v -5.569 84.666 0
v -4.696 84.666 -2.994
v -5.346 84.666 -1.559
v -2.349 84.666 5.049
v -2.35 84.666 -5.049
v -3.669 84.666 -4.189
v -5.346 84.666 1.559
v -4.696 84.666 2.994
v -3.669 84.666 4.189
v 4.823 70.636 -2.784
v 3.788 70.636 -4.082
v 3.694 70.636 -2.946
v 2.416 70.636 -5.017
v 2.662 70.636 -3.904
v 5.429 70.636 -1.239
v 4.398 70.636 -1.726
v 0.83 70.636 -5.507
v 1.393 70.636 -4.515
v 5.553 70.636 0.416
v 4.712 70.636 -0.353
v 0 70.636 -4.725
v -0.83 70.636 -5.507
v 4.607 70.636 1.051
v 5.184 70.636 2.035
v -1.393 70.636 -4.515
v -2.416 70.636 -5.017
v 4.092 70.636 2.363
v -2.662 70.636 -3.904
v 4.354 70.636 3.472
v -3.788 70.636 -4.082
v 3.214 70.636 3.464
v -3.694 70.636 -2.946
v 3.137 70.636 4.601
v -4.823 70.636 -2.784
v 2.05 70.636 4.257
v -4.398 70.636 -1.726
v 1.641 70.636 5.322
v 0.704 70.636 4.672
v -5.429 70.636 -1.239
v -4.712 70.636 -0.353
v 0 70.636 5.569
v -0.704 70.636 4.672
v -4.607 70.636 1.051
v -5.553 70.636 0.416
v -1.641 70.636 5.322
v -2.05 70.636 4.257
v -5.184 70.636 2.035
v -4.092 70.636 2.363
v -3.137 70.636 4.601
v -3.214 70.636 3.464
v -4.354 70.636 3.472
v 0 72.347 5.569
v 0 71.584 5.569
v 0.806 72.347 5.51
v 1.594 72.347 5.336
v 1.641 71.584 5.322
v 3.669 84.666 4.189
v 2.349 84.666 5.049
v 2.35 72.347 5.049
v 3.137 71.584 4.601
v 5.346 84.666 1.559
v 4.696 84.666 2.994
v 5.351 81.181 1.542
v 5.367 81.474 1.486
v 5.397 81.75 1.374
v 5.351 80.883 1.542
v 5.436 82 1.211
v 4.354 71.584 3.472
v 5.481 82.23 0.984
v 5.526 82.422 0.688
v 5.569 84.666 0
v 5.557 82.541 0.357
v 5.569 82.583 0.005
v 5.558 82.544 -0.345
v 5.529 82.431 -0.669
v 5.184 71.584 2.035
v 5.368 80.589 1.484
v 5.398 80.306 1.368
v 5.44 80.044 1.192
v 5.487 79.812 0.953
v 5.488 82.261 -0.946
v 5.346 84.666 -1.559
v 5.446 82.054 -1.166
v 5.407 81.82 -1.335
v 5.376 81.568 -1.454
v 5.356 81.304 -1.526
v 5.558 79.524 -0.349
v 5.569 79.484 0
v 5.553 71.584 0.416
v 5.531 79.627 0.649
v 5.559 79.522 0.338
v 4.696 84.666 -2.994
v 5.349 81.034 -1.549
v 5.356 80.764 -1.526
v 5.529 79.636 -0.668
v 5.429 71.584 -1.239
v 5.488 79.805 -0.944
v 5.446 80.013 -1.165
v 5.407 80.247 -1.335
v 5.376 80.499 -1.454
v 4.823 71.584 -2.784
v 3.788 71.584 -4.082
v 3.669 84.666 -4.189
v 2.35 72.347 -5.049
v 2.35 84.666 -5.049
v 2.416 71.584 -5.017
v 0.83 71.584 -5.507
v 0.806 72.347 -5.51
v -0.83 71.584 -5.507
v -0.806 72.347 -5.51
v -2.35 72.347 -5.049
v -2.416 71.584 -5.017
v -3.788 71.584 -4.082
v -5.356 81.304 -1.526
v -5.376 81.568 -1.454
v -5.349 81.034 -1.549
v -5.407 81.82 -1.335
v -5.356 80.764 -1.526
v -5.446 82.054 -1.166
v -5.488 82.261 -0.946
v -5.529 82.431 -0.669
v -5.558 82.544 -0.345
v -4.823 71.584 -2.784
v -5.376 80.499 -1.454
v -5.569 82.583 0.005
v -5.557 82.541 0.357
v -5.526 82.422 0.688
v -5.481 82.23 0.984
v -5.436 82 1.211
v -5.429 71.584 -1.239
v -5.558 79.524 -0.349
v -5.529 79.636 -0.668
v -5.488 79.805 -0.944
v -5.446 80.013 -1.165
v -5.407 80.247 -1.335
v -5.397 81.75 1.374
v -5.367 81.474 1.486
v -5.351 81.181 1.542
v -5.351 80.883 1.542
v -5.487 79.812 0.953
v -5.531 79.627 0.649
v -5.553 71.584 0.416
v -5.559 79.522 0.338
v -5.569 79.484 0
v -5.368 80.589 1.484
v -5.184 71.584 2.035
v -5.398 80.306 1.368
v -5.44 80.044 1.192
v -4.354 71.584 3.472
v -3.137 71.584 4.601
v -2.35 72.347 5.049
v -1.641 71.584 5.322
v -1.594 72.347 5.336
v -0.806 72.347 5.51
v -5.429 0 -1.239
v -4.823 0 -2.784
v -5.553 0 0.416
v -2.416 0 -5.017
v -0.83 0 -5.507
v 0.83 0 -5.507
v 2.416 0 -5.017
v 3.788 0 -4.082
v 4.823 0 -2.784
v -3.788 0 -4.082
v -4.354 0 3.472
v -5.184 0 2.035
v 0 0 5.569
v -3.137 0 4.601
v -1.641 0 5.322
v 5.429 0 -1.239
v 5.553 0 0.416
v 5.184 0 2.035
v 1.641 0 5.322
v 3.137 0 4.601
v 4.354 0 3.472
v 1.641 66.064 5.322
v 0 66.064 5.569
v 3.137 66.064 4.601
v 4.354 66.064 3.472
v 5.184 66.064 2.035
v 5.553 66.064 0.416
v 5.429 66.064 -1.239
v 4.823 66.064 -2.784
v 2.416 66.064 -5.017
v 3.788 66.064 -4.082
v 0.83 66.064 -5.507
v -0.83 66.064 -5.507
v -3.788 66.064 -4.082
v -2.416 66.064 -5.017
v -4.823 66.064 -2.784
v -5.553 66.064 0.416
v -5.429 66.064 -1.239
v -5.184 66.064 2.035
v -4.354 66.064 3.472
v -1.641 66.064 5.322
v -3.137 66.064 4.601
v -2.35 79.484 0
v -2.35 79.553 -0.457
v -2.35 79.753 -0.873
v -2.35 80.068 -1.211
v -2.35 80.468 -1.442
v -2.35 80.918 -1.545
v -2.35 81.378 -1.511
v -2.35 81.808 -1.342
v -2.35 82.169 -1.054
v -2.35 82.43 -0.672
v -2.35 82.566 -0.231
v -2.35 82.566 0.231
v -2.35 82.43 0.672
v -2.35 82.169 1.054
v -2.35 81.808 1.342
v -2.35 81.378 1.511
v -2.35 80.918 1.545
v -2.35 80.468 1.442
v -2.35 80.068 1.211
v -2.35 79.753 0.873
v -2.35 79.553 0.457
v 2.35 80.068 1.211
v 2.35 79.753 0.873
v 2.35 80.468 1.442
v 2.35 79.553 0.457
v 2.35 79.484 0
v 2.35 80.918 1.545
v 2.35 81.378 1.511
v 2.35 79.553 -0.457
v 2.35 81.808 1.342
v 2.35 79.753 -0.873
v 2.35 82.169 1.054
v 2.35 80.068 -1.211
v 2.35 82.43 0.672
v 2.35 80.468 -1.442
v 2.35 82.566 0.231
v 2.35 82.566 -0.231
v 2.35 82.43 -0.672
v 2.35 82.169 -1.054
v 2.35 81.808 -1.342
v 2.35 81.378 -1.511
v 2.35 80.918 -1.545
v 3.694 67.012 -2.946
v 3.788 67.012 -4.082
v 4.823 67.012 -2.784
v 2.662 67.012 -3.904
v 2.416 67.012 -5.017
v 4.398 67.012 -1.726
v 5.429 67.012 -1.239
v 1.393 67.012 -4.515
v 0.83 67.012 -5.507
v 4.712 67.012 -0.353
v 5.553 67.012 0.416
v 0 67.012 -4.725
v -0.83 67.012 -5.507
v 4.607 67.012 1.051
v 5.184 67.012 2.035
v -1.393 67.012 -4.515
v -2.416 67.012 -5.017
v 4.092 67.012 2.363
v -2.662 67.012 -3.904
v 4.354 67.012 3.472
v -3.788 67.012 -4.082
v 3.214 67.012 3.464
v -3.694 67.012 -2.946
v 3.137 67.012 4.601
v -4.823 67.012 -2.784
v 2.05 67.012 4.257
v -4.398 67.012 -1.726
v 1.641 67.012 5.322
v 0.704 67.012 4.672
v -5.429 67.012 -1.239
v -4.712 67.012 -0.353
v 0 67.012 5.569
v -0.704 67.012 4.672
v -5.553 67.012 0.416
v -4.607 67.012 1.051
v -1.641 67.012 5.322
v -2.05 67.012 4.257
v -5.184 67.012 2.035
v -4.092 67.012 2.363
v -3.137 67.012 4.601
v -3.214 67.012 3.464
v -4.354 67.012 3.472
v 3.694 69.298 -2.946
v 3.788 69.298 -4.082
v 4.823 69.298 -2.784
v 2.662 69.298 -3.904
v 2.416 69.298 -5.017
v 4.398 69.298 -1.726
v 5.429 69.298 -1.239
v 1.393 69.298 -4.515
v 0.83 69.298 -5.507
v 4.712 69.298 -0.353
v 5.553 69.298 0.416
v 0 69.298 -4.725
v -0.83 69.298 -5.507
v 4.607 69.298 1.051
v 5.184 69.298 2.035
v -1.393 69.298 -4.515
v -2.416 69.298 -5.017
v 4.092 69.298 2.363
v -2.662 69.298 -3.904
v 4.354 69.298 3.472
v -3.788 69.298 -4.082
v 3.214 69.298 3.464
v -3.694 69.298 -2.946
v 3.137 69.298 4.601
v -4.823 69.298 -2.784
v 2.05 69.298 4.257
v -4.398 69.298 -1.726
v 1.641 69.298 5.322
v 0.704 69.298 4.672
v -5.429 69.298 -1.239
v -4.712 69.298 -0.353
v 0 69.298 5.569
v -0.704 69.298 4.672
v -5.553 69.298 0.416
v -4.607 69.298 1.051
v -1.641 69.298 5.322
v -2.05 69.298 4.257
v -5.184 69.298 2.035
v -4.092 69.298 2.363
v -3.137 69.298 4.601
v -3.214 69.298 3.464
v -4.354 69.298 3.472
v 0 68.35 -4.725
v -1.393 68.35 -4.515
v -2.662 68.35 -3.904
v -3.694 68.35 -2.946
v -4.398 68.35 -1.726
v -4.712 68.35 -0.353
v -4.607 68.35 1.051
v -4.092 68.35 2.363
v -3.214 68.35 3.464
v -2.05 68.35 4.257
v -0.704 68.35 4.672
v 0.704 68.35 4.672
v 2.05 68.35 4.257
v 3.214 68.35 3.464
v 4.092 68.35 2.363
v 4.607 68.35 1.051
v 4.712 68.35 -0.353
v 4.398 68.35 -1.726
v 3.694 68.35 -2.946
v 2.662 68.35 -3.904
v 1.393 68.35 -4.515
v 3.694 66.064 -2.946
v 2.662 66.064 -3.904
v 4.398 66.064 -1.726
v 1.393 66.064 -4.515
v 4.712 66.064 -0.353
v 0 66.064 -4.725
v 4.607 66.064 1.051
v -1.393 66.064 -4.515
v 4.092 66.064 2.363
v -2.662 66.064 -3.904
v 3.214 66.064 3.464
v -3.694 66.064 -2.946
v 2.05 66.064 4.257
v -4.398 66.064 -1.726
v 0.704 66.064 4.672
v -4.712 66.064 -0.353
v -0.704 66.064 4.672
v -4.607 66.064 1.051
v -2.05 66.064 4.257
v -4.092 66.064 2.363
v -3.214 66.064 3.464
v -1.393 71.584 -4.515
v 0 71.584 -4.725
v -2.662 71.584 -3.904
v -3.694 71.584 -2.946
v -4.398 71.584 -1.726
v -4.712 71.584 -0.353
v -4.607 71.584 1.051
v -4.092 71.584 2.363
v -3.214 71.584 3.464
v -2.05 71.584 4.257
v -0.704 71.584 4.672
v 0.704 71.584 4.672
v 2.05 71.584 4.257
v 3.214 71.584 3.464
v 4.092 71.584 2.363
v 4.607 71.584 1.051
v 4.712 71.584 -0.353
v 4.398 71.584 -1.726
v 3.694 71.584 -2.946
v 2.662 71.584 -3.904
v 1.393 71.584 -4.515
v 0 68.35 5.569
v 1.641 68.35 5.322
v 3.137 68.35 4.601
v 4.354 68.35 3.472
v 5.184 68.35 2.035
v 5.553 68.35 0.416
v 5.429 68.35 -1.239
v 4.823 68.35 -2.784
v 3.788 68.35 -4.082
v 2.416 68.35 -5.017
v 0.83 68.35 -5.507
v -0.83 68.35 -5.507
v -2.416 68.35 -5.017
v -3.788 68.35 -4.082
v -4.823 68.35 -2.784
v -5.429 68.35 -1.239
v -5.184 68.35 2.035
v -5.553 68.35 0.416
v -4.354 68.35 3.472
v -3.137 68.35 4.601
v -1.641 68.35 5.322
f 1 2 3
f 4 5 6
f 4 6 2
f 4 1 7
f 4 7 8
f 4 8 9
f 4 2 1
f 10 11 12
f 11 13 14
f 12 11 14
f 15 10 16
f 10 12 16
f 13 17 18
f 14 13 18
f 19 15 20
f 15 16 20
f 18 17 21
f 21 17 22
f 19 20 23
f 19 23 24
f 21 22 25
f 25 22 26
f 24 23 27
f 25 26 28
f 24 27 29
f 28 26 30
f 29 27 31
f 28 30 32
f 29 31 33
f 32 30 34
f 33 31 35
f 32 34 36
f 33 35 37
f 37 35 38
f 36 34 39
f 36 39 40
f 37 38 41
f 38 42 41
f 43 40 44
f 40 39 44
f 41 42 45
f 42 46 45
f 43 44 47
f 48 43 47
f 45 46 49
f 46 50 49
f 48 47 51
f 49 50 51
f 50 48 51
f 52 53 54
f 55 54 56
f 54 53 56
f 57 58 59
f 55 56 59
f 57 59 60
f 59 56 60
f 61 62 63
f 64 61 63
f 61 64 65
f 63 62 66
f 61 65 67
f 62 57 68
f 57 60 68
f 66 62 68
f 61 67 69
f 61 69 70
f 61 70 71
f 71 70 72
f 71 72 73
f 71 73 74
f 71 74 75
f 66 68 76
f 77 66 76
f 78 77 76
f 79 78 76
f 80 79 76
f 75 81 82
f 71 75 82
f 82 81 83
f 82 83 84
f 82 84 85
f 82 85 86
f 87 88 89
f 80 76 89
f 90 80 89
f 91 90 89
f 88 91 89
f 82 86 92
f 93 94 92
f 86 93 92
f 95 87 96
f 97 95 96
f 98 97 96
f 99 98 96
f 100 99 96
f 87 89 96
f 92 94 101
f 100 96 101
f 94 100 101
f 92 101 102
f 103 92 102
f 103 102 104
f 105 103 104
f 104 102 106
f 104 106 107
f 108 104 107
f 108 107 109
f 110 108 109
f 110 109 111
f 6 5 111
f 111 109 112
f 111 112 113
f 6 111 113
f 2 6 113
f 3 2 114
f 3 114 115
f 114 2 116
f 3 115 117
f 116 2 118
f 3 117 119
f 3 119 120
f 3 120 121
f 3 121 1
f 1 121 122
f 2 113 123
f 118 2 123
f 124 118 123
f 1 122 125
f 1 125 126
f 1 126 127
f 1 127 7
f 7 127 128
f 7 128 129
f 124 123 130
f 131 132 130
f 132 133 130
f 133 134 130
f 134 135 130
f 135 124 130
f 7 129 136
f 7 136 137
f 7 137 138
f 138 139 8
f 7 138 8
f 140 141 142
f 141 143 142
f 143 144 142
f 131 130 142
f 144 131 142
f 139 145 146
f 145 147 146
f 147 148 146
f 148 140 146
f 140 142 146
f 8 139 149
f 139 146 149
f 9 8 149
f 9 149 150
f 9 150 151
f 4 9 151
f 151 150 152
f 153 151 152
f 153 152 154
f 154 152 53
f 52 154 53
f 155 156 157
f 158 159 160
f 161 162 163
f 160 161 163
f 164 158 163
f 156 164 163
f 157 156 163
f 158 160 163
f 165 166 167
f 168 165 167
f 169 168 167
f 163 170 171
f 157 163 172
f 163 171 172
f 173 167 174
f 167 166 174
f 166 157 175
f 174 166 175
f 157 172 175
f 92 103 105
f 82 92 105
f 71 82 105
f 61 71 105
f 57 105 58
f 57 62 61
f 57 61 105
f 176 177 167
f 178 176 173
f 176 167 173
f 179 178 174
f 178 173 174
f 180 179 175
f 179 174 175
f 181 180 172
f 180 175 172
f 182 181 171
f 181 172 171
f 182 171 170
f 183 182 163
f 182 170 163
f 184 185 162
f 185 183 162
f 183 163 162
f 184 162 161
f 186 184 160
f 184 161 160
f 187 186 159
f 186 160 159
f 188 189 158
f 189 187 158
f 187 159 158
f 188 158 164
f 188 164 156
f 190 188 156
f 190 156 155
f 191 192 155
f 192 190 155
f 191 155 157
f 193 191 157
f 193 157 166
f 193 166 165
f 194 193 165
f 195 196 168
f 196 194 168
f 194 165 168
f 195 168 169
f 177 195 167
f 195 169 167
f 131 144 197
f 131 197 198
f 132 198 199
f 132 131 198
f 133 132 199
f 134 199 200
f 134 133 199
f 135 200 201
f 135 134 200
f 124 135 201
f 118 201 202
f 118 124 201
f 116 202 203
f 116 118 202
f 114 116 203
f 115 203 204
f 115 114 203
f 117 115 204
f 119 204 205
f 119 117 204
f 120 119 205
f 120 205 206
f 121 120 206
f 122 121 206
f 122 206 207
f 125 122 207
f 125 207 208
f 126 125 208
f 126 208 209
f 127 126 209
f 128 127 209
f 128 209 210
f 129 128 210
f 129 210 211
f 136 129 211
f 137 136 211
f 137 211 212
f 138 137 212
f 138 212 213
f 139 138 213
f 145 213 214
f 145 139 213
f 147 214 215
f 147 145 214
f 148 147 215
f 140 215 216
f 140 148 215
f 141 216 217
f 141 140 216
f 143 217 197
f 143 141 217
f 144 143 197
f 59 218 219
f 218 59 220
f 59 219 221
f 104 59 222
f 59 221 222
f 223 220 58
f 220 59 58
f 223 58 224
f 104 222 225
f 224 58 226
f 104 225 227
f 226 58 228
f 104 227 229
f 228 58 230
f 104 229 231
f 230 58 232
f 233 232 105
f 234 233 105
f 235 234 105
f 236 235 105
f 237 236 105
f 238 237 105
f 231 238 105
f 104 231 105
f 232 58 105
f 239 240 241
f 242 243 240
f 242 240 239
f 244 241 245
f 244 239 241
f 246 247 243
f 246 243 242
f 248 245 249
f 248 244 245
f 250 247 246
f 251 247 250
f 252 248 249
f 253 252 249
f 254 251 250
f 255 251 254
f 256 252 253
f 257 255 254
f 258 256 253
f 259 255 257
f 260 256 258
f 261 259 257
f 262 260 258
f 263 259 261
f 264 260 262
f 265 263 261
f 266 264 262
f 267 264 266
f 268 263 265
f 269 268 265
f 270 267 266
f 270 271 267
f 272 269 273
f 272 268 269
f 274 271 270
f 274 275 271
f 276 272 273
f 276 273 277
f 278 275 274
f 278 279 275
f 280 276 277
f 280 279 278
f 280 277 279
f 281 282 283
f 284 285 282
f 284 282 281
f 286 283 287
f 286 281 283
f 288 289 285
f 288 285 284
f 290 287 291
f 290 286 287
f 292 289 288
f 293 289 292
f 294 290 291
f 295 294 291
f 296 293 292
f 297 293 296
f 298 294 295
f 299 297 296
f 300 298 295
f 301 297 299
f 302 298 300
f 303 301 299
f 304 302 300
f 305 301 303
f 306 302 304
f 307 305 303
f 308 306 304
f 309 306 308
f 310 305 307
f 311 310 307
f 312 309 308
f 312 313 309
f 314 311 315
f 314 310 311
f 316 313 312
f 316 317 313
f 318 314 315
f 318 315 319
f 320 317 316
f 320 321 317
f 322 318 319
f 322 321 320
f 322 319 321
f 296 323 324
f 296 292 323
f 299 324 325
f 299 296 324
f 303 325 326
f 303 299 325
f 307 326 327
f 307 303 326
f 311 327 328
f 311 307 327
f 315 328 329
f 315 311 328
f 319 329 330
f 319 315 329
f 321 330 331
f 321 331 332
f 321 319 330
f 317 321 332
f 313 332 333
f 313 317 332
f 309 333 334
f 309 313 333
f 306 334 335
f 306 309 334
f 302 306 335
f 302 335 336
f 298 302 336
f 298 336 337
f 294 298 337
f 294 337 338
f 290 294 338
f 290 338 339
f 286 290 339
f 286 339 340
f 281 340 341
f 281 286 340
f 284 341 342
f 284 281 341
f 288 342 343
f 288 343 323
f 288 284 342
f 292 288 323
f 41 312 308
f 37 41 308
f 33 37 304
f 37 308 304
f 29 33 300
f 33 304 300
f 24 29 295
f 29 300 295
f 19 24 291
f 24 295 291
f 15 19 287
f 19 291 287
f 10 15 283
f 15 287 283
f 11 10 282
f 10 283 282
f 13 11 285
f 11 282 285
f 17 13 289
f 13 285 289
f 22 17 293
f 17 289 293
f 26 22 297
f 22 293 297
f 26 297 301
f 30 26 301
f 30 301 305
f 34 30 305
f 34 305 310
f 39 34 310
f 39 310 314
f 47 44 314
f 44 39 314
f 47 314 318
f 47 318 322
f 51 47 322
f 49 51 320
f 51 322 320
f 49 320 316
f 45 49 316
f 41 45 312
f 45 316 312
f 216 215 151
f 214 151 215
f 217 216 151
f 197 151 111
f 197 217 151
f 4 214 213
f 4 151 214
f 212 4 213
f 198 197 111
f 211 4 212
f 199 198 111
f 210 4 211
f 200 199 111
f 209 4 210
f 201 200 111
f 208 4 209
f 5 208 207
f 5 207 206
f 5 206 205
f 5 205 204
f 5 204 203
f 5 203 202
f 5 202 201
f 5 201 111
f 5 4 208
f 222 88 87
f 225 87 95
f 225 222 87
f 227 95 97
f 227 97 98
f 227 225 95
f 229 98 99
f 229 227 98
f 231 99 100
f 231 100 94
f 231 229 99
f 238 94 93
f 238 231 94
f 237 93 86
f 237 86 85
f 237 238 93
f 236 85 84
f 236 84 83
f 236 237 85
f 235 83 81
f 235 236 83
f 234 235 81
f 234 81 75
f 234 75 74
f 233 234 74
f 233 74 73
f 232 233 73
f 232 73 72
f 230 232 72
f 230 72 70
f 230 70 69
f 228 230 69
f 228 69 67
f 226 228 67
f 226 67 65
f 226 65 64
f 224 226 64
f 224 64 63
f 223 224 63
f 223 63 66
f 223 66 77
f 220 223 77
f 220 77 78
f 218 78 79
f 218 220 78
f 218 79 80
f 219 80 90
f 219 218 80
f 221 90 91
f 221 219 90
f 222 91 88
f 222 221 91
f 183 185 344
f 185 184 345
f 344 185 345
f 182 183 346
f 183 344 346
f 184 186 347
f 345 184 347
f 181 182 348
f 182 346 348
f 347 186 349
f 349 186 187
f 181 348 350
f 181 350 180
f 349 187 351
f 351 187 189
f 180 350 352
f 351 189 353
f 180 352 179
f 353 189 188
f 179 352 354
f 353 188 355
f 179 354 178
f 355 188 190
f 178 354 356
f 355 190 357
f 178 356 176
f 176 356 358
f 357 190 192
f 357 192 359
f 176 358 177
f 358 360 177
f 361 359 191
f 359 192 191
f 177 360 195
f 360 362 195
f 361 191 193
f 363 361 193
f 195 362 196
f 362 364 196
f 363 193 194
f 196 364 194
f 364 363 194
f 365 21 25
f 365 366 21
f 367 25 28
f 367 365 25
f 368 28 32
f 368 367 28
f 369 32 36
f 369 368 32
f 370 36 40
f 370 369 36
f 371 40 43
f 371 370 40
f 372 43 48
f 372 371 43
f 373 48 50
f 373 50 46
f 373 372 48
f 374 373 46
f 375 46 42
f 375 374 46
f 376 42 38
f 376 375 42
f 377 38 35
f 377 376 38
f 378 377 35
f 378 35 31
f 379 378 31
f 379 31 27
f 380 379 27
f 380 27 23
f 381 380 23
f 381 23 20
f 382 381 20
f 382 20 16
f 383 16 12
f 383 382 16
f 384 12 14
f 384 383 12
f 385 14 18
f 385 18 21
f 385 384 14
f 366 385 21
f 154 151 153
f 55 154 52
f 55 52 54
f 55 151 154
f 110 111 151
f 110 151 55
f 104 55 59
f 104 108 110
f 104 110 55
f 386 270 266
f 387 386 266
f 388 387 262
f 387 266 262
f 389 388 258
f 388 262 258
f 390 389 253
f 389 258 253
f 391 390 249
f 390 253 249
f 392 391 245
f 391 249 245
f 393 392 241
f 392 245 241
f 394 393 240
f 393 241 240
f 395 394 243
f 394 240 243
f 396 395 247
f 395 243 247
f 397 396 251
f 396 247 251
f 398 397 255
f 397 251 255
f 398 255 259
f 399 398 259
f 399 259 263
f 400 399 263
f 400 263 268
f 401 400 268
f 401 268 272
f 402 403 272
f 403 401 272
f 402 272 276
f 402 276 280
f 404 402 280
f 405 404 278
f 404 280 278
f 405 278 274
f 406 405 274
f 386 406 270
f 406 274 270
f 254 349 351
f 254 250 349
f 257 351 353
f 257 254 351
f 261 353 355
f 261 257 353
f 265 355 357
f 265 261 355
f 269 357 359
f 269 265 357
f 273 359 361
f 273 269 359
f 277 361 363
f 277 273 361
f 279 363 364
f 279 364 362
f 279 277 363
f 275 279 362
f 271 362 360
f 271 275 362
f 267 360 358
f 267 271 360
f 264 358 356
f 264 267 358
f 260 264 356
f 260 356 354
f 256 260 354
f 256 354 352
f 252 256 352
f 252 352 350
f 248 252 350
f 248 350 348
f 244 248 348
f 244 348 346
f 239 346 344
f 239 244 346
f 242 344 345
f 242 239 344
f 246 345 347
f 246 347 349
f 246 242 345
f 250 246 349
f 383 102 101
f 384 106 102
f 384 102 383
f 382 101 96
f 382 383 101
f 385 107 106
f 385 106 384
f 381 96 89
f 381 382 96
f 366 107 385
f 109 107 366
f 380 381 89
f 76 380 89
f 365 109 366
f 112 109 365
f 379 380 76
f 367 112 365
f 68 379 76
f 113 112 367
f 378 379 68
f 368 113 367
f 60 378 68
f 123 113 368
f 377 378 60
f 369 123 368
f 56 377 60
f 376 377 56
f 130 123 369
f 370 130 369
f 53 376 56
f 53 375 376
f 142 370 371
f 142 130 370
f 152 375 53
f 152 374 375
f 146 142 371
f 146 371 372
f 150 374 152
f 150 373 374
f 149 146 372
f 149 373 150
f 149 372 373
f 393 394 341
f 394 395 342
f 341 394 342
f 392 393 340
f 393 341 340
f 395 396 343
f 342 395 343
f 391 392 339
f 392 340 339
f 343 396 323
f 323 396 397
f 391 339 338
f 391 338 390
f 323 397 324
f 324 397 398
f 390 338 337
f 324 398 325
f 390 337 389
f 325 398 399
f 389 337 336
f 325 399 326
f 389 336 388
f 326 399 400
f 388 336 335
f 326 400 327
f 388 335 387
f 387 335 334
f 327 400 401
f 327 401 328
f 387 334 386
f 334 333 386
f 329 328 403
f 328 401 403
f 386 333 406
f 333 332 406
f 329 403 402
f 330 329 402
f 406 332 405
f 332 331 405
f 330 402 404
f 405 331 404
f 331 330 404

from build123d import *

# Parameters (mm, degrees)
SKETCH1_R               = 5.56895
BOSS_EXTRUDE1_DEPTH     = 84.66582
SKETCH2_W               = 4.699
SKETCH2_H               = 16.131480258
CUT_EXTRUDE1_DEPTH      = 12.319
CUT_EXTRUDE2_DEPTH      = 86.031332369
CUT_EXTRUDE2_DEPTH_BACK = 86.031332369
SKETCH3_R               = 1.5494
SKETCH4_W               = 0.843885596
SKETCH4_H               = 0.947610215
LPATTERN1_COUNT         = 3
LPATTERN1_PITCH         = 2.286


with BuildPart() as part:
    # Sketch1 → Boss-Extrude1 (new body)
    with BuildSketch(Plane(origin=(0, 0, 0), x_dir=(1, 0, 0), z_dir=(0, 1, 0))):
        with Locations(Location((0, 0, 0), (0, 0, 270))):
            Circle(SKETCH1_R)
    extrude(amount=BOSS_EXTRUDE1_DEPTH)

    # Sketch2 → Cut-Extrude1 (cut)
    with BuildSketch(Plane(origin=(0, 84.66582, 0), x_dir=(1, 0, 0), z_dir=(0, 1, 0))):
        Rectangle(SKETCH2_W, SKETCH2_H)
    extrude(amount=-CUT_EXTRUDE1_DEPTH, mode=Mode.SUBTRACT)

    # Sketch3 → Cut-Extrude2 (cut, two sides: drawn at the far end of the back side and taken through both)
    with BuildSketch(Plane(origin=(0, 0, 0), x_dir=(0, 0, -1), z_dir=(1, 0, 0)).offset(-CUT_EXTRUDE2_DEPTH_BACK)):
        with Locations(Location((0, 81.03362, 0), (0, 0, 270))):
            Circle(SKETCH3_R)
    extrude(amount=CUT_EXTRUDE2_DEPTH + CUT_EXTRUDE2_DEPTH_BACK, mode=Mode.SUBTRACT)

    # Sketch4 → Cut-Revolve1 (revolve, cut)
    with BuildSketch(Plane(origin=(0, 0, 0), x_dir=(0, 0, -1), z_dir=(1, 0, 0))):
        with Locations((5.147007202, 71.109959008)):
            Rectangle(SKETCH4_W, SKETCH4_H)
    cut_revolve1 = revolve(axis=Axis((0, -4.233291, 0), (0, 1, 0)), mode=Mode.SUBTRACT)

    # LPattern1: Cut-Revolve1 ×3
    with Locations(*[(0, -i * LPATTERN1_PITCH, 0) for i in range(1, LPATTERN1_COUNT)]):
        add(cut_revolve1, mode=Mode.SUBTRACT)


solid = part.part
